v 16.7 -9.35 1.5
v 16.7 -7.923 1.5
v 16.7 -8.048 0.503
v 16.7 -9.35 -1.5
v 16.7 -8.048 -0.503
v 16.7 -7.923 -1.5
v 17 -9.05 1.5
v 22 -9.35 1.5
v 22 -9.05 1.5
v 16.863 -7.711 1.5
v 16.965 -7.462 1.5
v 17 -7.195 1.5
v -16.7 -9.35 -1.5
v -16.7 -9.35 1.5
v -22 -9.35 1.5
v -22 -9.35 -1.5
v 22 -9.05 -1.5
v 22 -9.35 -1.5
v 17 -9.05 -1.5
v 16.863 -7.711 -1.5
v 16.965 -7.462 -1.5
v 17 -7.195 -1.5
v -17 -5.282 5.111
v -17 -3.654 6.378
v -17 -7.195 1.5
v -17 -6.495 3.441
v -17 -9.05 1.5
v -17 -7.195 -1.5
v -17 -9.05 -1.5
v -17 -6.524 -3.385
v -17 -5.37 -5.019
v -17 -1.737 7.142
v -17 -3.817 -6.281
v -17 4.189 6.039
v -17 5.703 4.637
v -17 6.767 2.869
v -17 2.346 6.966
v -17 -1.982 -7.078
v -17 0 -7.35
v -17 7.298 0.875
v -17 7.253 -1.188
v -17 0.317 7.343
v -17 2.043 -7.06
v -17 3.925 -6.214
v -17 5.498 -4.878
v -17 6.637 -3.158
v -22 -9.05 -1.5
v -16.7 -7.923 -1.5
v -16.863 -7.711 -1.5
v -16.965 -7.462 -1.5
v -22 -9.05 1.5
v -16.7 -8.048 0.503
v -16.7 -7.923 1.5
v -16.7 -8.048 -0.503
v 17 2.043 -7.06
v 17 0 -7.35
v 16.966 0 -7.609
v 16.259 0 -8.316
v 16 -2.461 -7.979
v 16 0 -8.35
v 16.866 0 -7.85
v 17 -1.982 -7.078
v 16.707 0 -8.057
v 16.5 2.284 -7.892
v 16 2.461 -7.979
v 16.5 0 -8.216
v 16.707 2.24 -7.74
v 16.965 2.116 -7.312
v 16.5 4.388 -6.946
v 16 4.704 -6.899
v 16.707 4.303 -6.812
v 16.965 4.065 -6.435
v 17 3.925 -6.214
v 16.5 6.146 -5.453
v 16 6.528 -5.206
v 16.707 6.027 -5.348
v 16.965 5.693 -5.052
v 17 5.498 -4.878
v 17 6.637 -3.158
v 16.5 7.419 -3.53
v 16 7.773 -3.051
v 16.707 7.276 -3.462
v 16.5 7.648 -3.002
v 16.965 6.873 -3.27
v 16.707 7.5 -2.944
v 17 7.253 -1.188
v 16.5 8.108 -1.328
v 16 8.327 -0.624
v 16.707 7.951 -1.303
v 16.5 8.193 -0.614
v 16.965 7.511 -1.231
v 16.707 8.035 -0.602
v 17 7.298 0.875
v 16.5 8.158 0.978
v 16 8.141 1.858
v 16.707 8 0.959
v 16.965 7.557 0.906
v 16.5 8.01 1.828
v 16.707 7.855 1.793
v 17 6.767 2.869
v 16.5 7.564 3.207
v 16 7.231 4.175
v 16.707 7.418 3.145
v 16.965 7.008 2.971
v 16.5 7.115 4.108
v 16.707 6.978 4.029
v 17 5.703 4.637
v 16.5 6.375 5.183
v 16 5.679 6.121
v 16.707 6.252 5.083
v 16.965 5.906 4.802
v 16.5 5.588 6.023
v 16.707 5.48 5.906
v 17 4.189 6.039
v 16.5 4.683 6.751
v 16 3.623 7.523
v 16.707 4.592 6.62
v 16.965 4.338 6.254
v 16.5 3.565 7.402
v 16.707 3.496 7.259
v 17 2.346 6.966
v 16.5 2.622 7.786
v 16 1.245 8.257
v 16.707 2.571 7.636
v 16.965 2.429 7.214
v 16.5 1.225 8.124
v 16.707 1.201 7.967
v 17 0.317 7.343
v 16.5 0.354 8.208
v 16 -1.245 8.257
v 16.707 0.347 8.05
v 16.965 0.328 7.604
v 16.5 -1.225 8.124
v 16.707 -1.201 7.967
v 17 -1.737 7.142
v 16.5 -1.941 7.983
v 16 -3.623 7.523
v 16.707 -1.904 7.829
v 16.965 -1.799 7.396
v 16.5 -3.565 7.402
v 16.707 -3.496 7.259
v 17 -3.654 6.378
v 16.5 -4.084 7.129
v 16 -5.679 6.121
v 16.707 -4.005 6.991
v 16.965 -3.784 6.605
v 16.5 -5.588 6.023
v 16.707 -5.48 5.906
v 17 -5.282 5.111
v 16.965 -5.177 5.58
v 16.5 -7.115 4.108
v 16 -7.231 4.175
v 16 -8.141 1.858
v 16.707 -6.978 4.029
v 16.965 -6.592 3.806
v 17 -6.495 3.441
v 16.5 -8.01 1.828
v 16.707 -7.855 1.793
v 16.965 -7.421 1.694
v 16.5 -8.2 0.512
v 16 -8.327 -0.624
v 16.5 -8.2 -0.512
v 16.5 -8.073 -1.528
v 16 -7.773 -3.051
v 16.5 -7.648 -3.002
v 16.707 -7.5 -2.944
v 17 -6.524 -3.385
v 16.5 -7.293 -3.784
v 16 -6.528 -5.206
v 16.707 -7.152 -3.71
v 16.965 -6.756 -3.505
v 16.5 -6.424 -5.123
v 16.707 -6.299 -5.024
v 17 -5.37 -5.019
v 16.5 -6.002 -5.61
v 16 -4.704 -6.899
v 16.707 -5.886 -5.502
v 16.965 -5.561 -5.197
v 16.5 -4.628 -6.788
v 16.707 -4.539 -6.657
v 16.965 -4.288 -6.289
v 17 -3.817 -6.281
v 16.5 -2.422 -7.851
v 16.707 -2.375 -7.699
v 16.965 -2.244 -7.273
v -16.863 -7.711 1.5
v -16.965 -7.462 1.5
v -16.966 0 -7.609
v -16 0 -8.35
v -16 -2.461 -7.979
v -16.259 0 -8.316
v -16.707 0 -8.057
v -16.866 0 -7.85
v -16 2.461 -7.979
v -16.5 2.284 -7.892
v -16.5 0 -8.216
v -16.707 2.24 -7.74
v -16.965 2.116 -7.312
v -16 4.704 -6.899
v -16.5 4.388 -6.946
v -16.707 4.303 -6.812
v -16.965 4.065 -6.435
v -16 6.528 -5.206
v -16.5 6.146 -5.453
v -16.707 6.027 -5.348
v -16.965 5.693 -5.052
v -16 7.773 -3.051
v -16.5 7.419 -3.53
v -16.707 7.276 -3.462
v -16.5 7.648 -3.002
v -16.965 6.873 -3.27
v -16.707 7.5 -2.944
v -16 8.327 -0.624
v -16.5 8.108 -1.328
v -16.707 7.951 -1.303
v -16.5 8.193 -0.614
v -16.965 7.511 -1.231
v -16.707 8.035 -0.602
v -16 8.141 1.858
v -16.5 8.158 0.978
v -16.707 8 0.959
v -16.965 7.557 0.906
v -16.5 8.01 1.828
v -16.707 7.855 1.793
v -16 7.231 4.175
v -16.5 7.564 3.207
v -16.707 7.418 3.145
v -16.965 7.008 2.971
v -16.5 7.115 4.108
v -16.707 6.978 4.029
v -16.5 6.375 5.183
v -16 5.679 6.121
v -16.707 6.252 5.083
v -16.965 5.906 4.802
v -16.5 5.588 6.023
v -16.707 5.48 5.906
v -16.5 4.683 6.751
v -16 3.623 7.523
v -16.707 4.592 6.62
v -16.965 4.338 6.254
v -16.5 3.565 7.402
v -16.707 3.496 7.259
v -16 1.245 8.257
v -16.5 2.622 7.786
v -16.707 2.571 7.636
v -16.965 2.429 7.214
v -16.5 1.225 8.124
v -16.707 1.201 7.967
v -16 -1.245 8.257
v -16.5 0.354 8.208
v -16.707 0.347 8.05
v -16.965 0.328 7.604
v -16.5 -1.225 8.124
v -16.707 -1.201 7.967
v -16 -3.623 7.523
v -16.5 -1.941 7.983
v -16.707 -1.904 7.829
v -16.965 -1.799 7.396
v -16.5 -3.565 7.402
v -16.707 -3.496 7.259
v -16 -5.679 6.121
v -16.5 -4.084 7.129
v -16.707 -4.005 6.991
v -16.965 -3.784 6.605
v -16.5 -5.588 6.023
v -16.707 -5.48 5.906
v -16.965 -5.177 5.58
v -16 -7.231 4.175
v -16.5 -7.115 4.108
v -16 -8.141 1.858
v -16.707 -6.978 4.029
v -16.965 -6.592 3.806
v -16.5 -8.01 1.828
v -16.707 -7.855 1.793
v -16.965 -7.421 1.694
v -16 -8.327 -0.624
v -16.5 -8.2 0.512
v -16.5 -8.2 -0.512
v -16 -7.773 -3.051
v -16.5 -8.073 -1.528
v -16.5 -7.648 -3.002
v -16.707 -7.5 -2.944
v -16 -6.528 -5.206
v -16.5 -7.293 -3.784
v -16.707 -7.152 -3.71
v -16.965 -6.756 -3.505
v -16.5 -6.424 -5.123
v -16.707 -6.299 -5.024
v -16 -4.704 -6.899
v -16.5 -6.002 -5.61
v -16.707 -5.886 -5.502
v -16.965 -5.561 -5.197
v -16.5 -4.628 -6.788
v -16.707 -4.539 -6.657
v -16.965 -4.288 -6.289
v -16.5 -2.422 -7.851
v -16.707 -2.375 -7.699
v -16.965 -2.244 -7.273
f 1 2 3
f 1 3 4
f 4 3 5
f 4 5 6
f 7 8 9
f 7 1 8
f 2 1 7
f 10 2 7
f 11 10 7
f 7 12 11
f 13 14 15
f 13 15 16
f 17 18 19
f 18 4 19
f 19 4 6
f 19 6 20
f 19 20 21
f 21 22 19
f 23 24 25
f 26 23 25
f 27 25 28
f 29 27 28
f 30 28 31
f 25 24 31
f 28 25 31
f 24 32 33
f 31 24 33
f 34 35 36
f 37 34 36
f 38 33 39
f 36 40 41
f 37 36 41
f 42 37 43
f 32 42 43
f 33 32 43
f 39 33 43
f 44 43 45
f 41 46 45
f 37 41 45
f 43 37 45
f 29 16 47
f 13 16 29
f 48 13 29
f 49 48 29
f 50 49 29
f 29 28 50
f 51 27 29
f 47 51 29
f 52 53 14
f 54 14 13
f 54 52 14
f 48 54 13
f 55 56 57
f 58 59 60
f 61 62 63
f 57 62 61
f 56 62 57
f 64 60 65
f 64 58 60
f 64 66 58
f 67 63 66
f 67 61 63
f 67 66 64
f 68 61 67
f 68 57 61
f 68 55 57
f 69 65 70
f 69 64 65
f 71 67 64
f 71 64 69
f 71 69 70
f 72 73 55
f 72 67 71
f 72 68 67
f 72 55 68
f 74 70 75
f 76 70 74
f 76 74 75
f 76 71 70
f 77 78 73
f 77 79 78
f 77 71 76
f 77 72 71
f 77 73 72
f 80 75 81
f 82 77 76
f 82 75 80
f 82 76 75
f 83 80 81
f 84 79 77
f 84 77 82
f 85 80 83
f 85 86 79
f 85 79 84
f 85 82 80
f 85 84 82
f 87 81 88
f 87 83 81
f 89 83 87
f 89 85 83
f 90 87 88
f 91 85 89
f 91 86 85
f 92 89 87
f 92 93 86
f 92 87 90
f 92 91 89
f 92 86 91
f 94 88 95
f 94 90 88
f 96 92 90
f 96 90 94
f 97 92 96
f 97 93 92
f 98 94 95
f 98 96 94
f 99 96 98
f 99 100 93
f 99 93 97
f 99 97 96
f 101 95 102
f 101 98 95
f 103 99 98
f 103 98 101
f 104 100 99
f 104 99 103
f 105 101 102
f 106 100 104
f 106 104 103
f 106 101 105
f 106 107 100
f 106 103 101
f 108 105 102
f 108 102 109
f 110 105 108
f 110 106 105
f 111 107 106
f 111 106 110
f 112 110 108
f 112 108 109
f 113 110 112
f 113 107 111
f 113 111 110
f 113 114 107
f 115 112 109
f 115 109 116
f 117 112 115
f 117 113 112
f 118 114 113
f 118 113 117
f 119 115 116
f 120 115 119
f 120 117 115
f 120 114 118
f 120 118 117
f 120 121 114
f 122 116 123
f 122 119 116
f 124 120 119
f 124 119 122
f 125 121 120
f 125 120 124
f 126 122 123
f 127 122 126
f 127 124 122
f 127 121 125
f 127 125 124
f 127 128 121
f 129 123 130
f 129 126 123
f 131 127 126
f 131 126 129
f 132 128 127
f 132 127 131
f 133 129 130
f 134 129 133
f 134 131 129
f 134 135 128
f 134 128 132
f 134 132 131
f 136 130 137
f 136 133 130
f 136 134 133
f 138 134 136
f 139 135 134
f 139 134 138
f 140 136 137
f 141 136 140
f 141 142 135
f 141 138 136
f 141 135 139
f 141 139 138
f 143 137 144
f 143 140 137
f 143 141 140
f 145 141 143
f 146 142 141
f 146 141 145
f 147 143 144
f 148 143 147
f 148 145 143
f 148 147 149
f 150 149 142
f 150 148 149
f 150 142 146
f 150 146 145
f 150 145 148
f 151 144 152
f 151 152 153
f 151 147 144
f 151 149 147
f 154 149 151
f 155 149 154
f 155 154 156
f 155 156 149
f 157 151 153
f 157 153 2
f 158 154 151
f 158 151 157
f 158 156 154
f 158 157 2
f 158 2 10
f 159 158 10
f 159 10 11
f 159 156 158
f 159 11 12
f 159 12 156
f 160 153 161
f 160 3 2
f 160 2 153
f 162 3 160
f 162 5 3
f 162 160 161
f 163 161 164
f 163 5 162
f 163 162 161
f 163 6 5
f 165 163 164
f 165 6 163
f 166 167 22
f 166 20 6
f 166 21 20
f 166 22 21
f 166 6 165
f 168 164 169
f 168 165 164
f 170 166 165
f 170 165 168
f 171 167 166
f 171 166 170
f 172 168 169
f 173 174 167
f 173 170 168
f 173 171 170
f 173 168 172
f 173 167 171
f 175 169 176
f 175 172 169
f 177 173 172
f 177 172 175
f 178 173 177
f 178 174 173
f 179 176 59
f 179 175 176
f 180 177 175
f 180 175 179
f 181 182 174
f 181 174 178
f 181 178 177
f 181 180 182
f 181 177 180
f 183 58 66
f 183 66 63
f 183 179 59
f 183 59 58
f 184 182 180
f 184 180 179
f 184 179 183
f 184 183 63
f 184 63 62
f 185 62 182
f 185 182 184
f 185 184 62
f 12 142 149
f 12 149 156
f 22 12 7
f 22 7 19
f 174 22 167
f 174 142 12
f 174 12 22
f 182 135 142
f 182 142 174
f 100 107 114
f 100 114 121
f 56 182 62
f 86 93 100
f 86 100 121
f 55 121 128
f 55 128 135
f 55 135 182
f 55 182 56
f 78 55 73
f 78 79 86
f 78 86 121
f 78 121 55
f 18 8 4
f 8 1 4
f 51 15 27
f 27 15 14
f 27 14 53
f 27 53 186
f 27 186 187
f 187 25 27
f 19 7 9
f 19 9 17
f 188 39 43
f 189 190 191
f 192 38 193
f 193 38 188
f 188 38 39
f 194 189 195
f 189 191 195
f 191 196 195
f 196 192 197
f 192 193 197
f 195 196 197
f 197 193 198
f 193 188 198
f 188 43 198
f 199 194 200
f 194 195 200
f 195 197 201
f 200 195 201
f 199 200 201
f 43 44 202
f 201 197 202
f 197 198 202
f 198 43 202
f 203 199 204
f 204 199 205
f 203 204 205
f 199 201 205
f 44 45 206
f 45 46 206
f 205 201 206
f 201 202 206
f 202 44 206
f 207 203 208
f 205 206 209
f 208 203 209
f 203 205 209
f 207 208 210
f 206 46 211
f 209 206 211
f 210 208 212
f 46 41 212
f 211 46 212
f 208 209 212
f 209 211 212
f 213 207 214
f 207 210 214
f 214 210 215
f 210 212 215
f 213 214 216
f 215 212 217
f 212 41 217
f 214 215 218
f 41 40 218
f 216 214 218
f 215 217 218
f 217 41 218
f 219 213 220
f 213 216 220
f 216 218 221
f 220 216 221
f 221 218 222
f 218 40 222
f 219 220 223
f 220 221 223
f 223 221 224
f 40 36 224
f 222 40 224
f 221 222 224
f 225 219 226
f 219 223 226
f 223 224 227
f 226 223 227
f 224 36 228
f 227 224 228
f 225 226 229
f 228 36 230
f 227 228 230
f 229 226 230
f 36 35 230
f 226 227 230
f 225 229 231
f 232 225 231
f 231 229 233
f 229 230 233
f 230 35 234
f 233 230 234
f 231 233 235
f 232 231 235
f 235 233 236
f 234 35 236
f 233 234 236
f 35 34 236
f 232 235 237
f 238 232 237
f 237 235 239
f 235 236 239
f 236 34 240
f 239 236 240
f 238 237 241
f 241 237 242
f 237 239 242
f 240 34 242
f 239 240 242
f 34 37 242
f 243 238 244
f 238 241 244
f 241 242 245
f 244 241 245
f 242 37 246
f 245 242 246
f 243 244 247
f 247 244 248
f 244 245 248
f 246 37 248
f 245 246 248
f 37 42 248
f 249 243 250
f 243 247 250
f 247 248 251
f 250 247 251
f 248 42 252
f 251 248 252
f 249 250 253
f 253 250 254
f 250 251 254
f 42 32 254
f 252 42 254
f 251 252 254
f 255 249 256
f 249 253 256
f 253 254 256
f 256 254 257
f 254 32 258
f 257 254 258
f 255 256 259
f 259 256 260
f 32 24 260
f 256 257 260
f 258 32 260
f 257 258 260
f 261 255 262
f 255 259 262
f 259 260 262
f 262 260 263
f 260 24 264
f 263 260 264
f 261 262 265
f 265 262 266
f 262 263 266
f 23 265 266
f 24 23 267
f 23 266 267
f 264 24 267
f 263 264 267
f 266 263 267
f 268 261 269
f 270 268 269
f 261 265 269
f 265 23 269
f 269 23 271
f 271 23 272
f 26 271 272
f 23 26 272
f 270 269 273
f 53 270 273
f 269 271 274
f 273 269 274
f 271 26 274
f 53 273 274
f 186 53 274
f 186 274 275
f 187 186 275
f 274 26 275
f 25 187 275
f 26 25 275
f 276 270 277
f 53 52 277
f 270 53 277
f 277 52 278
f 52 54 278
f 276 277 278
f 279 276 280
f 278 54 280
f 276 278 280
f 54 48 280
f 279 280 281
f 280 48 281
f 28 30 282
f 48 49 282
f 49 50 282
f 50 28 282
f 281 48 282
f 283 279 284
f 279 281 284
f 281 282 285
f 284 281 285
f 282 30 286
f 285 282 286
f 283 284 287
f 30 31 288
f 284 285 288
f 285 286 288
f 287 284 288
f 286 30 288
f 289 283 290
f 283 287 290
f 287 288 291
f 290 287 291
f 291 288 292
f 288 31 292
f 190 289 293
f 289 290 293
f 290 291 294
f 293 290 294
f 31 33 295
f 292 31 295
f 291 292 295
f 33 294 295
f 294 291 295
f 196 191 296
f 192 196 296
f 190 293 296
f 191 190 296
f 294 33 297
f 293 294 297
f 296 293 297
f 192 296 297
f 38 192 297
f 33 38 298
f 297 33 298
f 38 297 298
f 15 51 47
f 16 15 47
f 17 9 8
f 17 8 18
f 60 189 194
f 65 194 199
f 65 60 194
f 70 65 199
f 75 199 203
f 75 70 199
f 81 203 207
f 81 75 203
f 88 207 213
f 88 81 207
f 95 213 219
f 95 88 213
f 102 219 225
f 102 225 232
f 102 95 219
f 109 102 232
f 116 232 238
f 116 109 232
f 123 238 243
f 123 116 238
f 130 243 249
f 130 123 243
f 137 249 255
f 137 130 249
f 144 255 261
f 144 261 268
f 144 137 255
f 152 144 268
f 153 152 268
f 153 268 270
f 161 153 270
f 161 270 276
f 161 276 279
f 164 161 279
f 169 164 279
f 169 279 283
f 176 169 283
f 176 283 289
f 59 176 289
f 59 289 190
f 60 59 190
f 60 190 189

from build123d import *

# Parameters (mm, degrees)
SKETCH_1_R      = 8.35
EXTRUDE_1_DEPTH = 17
FILLET_1_R      = 1
EXTRUDE_2_DEPTH = 0.3
SKETCH_3_W      = 3
SKETCH_3_H      = 0.3
EXTRUDE_3_DEPTH = 5


with BuildPart() as part:
    # Эскиз1 → Бобышка-Вытянуть1 (new, symmetric)
    with BuildSketch(Plane(origin=(0, 0, 0), x_dir=(0, 0, -1), z_dir=(1, 0, 0))):
        Circle(SKETCH_1_R)
    extrude(amount=EXTRUDE_1_DEPTH, both=True)

    # Скругление1
    fillet_1_edges = [part.edges().sort_by_distance(p)[0] for p in [
        (-17, 0, 8.35),
        (17, 0, 8.35),
    ]]
    fillet(fillet_1_edges, radius=FILLET_1_R)

    # Эскиз2 → Бобышка-Вытянуть2 (add)
    with BuildSketch(Plane(origin=(17, 0, 0), x_dir=(0, 0, -1), z_dir=(1, 0, 0))):
        with BuildLine():
            Line((-1.5, -9.35), (1.5, -9.35))
            Line((1.5, -9.35), (1.5, -7.195310973))
            ThreePointArc((1.5, -7.195310973), (0, -7.35), (-1.5, -7.195310973))
            Line((-1.5, -7.195310973), (-1.5, -9.35))
        make_face()
    extrude_2 = extrude(amount=-EXTRUDE_2_DEPTH)

    # Эскиз3 → Бобышка-Вытянуть3 (add)
    with BuildSketch(Plane(origin=(17, 0, 0), x_dir=(0, 0, -1), z_dir=(1, 0, 0))):
        with Locations((0, -9.2)):
            Rectangle(SKETCH_3_W, SKETCH_3_H)
    extrude_3 = extrude(amount=EXTRUDE_3_DEPTH)

    # Зеркальное отражение1: Бобышка-Вытянуть2, Бобышка-Вытянуть3 across plane
    add(extrude_2.mirror(Plane(origin=(0, 0, 0), x_dir=(0, 0, 1), z_dir=(1, 0, 0))))
    add(extrude_3.mirror(Plane(origin=(0, 0, 0), x_dir=(0, 0, 1), z_dir=(1, 0, 0))))


solid = part.part
